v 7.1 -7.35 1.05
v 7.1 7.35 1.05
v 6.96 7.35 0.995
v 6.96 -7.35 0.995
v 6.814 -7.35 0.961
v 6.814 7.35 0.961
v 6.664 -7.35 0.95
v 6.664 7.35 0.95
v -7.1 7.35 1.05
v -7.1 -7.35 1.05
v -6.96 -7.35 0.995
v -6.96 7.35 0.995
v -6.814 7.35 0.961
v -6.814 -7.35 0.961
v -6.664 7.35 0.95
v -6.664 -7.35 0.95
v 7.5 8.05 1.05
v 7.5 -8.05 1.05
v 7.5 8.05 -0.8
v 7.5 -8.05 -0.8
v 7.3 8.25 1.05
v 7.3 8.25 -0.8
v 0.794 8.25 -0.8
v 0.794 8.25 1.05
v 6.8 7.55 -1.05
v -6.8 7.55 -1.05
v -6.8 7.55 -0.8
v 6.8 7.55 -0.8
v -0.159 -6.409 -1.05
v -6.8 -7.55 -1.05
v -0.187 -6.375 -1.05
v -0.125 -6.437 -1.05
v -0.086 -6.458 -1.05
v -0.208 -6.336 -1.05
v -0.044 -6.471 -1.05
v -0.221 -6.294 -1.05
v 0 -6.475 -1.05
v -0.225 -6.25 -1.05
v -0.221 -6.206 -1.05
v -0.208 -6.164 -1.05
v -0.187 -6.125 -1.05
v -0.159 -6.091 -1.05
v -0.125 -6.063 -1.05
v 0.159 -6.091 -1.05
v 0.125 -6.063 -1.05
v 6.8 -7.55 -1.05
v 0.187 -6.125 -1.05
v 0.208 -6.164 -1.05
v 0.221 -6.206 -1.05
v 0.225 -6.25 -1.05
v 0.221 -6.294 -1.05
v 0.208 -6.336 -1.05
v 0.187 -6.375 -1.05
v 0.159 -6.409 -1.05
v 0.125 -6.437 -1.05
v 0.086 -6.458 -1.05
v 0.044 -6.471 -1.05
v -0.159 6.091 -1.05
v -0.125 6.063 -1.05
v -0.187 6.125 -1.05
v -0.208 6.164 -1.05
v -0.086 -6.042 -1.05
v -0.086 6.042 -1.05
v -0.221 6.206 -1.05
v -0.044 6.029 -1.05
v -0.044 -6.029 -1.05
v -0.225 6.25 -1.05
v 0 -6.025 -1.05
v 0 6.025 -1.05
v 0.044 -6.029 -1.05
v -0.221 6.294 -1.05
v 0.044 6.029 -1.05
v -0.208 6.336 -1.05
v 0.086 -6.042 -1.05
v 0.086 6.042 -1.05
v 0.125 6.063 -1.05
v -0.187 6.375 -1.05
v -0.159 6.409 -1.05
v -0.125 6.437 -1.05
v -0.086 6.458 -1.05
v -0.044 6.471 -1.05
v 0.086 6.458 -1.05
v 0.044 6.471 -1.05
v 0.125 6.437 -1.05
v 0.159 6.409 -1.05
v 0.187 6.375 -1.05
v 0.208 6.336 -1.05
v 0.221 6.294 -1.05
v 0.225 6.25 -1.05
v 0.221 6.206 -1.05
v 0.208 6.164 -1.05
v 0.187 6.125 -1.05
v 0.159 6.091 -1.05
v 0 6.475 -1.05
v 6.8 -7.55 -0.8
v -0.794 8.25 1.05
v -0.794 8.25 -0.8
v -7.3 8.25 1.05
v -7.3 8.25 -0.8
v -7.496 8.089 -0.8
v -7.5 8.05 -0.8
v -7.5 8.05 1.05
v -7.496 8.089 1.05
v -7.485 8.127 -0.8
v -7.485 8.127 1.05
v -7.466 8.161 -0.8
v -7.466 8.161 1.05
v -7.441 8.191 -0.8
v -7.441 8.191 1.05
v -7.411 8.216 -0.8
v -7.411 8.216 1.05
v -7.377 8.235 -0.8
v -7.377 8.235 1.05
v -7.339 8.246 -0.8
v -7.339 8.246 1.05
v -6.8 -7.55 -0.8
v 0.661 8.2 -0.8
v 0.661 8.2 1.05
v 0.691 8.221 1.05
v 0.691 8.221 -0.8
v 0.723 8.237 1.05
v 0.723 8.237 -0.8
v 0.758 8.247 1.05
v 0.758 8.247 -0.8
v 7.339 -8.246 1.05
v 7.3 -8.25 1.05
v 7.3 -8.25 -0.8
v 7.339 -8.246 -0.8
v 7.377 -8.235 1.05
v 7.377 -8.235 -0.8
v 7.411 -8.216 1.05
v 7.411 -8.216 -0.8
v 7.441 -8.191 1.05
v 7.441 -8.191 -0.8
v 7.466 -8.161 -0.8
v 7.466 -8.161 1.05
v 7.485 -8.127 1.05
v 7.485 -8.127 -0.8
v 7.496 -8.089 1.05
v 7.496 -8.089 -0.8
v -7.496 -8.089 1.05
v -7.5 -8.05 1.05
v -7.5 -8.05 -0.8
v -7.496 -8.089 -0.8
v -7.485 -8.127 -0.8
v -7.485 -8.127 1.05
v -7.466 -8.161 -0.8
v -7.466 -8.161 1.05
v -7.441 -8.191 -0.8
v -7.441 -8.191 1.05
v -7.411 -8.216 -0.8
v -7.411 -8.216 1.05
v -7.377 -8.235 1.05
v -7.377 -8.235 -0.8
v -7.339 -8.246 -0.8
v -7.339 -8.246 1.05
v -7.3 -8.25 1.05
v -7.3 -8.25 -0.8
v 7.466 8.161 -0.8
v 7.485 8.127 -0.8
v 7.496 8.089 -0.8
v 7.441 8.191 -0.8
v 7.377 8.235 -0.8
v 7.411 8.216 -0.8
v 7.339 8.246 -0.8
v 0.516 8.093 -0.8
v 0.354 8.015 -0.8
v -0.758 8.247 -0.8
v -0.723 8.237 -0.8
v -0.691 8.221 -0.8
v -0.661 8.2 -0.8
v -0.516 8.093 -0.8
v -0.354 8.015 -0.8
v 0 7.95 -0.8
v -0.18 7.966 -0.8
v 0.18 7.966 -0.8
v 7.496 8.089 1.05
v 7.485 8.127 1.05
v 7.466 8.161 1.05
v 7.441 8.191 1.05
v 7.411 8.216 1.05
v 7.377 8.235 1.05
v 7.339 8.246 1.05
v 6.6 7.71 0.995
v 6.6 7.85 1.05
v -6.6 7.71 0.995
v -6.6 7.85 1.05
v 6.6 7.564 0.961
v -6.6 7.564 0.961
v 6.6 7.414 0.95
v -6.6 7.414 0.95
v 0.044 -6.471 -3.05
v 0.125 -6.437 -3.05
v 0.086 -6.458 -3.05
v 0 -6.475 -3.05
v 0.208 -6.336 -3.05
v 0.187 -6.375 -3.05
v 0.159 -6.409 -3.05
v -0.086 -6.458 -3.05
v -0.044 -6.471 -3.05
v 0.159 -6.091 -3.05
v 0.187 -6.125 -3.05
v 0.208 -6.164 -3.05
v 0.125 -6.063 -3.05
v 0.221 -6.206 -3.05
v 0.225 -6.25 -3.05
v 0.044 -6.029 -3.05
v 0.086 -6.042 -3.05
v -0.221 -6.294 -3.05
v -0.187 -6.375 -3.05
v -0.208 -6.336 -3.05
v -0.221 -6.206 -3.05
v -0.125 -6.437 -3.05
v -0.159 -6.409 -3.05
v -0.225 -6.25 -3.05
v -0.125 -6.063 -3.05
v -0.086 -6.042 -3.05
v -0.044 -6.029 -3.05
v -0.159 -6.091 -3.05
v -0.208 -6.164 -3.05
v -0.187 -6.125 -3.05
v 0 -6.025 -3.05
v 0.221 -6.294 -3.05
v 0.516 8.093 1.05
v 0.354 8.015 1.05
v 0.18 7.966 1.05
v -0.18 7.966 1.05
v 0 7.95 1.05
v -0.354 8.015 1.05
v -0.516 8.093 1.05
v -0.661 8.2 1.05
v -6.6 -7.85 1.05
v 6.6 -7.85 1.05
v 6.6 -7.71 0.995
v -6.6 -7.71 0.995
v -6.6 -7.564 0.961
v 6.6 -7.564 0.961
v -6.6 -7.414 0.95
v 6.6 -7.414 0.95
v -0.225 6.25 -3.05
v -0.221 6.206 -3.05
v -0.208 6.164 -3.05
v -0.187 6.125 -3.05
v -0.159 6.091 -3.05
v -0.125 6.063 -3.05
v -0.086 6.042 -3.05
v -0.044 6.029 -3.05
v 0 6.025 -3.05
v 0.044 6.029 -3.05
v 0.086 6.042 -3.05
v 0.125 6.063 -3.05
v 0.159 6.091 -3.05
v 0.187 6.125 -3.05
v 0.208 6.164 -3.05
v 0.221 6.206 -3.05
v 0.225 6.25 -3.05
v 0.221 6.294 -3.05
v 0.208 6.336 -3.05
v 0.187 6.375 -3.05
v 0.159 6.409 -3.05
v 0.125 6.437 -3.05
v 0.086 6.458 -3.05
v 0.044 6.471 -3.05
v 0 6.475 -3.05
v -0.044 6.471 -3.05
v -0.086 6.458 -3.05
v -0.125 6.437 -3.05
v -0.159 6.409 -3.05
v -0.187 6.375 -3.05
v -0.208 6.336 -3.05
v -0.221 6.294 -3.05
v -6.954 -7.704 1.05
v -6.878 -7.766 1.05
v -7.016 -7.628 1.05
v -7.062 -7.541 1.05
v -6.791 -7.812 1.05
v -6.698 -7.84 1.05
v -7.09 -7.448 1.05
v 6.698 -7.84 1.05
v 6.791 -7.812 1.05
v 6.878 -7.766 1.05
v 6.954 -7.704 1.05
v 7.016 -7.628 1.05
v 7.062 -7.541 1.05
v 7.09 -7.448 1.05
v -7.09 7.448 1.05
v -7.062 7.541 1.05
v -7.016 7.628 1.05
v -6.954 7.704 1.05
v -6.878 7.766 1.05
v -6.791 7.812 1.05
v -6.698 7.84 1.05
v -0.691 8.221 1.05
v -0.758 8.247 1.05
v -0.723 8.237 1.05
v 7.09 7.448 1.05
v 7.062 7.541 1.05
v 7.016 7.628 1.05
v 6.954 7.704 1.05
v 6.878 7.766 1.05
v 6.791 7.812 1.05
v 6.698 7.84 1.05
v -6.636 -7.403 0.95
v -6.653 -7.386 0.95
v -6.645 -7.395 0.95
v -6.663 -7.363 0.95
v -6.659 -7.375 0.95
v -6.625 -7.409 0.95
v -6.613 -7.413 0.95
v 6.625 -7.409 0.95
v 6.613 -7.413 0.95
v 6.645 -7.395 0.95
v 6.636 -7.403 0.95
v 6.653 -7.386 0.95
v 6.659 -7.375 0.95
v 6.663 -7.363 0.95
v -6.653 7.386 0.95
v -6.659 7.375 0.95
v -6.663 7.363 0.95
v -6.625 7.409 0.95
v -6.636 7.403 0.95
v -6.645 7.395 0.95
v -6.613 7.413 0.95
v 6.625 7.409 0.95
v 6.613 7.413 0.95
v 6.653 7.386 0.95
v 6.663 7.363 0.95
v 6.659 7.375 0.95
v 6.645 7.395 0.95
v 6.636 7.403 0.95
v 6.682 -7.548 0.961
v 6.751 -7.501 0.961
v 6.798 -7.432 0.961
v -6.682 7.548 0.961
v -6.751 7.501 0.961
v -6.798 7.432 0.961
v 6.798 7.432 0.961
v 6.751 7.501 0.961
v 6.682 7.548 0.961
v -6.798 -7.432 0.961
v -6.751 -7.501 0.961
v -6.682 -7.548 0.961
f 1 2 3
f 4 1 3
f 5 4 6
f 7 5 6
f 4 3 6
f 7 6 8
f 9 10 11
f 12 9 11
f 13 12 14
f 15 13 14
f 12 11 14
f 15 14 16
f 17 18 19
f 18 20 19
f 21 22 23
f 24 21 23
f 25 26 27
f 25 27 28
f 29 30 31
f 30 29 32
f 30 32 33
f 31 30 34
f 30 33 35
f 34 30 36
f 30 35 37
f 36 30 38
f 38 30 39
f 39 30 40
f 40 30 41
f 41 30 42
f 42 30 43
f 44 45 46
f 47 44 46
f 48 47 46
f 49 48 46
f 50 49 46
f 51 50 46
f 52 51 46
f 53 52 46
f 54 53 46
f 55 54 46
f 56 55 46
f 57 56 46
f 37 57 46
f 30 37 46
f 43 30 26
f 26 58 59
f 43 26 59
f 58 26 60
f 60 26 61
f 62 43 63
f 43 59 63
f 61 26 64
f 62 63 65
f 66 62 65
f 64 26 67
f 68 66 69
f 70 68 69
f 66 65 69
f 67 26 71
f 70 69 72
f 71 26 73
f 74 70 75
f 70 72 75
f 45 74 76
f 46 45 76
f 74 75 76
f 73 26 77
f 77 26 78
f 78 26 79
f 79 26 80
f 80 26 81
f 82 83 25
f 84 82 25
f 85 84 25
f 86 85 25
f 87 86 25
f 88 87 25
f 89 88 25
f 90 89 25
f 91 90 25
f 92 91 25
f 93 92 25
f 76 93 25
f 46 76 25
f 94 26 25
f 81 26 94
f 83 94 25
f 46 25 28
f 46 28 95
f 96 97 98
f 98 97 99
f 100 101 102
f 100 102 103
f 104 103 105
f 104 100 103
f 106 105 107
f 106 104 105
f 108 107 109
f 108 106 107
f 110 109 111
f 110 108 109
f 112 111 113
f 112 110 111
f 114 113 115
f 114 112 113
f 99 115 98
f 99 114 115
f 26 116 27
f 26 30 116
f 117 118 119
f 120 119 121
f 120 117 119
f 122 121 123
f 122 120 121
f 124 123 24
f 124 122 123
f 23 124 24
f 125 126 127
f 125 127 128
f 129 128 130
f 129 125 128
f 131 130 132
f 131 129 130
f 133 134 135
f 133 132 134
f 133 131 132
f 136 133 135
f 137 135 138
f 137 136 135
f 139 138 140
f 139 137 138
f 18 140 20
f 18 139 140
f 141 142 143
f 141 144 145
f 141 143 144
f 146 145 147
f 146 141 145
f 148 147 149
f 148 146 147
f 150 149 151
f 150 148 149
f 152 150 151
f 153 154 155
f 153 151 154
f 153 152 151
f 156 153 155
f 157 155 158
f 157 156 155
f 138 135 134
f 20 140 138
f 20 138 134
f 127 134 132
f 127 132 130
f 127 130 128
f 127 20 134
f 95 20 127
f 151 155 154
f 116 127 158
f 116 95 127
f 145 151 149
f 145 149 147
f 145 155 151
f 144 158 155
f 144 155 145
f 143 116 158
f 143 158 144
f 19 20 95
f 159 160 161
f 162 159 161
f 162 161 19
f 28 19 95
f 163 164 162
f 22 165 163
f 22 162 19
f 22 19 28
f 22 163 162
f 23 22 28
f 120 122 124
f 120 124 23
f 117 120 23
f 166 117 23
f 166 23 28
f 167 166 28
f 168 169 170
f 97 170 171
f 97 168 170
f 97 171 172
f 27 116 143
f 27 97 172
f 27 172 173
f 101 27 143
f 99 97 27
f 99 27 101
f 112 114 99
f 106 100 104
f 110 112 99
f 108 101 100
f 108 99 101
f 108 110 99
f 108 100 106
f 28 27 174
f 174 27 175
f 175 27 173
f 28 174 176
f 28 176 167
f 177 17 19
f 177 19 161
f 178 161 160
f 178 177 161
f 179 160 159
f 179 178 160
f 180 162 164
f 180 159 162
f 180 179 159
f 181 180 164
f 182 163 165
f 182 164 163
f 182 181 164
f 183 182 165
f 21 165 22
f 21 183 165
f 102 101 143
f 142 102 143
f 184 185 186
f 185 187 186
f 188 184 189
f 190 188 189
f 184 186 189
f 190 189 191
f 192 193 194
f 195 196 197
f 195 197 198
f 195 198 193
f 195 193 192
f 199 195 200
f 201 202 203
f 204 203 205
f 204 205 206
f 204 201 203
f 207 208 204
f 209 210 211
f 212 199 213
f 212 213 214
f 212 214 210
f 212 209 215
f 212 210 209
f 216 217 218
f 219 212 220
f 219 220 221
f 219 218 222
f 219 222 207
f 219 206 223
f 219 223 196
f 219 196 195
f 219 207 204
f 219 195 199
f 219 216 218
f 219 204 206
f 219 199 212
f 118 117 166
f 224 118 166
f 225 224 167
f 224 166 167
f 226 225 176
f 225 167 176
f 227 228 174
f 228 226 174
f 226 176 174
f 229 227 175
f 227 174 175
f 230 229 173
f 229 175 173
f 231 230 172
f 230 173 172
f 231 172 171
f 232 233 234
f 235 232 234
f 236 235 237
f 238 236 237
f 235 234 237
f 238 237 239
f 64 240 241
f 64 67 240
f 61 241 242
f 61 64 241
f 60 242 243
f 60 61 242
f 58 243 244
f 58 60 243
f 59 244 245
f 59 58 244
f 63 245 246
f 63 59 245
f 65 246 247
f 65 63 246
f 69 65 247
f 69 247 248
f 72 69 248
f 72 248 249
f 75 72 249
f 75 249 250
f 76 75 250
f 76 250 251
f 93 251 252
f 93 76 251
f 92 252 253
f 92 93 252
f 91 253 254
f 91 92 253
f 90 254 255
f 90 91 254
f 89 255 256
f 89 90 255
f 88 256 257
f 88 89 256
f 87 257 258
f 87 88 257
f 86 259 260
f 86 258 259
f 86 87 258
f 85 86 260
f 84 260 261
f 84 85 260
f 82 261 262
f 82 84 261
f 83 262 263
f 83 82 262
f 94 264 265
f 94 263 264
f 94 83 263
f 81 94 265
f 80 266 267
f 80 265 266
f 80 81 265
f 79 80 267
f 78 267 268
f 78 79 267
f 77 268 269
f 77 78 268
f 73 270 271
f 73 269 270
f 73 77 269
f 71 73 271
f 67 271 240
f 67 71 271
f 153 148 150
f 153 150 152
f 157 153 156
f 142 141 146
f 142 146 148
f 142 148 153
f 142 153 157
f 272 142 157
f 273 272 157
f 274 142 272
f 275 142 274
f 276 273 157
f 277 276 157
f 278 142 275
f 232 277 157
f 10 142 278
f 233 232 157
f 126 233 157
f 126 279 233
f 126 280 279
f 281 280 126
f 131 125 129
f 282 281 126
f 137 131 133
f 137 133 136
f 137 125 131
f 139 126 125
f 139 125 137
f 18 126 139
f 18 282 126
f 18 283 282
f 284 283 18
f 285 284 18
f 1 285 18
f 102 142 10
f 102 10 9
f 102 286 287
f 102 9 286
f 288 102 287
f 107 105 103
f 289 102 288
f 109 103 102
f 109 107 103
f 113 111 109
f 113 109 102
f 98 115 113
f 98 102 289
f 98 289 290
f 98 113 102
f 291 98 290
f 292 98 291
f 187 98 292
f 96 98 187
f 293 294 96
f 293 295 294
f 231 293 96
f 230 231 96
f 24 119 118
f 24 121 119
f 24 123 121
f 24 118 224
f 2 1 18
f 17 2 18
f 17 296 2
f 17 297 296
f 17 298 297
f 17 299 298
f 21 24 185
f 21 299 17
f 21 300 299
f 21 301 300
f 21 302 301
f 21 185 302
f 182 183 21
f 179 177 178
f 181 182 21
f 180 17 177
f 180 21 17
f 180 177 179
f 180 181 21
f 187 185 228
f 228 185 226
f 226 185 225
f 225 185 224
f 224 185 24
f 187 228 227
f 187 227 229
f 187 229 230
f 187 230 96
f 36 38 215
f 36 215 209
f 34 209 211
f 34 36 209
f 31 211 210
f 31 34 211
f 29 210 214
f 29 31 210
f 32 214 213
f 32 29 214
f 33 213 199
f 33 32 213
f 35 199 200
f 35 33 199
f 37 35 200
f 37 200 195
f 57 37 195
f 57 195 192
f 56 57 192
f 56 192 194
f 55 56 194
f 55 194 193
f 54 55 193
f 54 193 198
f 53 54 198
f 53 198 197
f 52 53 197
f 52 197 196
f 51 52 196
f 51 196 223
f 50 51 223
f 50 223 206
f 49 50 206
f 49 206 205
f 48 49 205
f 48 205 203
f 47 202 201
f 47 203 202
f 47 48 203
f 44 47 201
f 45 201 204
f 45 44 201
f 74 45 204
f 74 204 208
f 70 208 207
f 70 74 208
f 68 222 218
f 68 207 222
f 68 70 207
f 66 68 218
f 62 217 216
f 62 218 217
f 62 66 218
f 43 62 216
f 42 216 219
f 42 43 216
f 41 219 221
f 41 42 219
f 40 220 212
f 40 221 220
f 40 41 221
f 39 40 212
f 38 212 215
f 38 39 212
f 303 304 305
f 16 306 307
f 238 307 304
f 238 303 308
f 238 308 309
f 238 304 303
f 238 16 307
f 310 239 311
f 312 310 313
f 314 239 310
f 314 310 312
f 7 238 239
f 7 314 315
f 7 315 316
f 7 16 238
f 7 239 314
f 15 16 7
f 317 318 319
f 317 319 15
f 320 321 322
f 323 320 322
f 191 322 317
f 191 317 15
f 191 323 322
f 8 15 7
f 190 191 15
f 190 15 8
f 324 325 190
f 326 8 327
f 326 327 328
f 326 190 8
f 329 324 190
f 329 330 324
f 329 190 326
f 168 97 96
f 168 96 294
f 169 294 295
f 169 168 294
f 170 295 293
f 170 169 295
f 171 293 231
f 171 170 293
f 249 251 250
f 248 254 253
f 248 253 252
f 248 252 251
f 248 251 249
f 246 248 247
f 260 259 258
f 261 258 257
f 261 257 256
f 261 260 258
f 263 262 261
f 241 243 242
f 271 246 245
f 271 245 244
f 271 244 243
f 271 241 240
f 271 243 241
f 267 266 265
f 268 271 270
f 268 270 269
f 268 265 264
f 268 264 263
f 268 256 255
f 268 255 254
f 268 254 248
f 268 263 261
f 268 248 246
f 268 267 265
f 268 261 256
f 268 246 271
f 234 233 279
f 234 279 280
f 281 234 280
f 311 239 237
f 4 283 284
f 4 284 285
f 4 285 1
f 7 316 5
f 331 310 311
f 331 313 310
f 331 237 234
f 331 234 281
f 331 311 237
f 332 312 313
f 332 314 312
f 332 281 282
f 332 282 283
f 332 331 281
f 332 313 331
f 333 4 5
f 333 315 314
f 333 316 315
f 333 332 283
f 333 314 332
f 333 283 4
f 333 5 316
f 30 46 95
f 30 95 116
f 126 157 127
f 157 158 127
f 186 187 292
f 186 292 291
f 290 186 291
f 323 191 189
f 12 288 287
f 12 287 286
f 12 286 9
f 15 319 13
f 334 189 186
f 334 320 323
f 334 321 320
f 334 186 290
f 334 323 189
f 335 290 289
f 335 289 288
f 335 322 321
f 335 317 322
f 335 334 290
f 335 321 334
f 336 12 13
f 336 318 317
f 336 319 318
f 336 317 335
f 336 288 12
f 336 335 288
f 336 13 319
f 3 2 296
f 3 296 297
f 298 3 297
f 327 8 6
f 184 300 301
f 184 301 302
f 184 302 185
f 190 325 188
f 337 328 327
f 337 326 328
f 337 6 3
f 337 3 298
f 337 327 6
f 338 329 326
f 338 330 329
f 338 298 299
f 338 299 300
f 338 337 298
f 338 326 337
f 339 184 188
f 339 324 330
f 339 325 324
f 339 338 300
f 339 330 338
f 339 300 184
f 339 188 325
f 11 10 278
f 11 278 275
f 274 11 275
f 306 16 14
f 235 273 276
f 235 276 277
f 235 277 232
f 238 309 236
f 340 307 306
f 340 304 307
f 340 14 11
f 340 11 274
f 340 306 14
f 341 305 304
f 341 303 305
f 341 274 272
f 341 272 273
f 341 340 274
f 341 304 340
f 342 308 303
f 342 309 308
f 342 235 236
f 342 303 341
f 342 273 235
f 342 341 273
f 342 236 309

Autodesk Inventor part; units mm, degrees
ref_plane "YZ Plane" through (0, 0, 0) normal (1, 0, 0) x (0, 1, 0)
ref_plane "XZ Plane" through (0, 0, 0) normal (0, 1, 0) x (-1, 0, 0)
ref_plane "XY Plane" through (0, 0, 0) normal (0, 0, 1) x (1, 0, 0)
sketch "Sketch1" plane through (0, 0, 0) normal (0, 0, 1) x (1, 0, 0)
  line L0 (-7.5, -8.25) -> (7.5, -8.25)
  line L1 (7.5, -8.25) -> (7.5, 8.25)
  line L2 (7.5, 8.25) -> (-7.5, 8.25)
  line L3 (-7.5, 8.25) -> (-7.5, -8.25)
  line L4 (-7.5, -8.25) -> (7.5, 8.25) construction
  line L5 (7.5, -8.25) -> (-7.5, 8.25) construction
  arc A0 (-0.7141, 8.25) -> (0.7141, 8.25) centre (0, 8.95) ccw
  line L6 (0, 7.95) -> (0, 8.25) construction
  point P0 (0, 0)
  dimension "d0" = 15
  dimension "d1" = 16.5
  dimension "d23" = 0.3
  dimension "d24" = 1
extrude "Extrusion1" add sketch "Sketch1" along normal mid plane 2.1 contours L3 L2 A0 L1 L0
fillet "Fillet1" radius 0.2 6 edges at (-7.5, 8.25, 0) (7.5, 8.25, 0) (7.5, -8.25, 0) (-7.5, -8.25, 0) (-0.7141, 8.25, 0) (0.7141, 8.25, 0)
sketch "Sketch2" plane through (0, 0, 1.05) normal (0, 0, 1) x (1, 0, 0)
  arc A0 (-7.5, -8.05) -> (-7.3, -8.25) centre (-7.3, -8.05) ccw projected
  line L0 (-7.3, -8.25) -> (7.3, -8.25) projected
  arc A1 (7.3, -8.25) -> (7.5, -8.05) centre (7.3, -8.05) ccw projected
  line L1 (7.5, -8.05) -> (7.5, 8.05) projected
  arc A2 (7.5, 8.05) -> (7.3, 8.25) centre (7.3, 8.05) ccw projected
  line L2 (7.3, 8.25) -> (0.7937, 8.25) projected
  arc A3 (-7.3, 8.25) -> (-7.5, 8.05) centre (-7.3, 8.05) ccw projected
  line L3 (-7.5, 8.05) -> (-7.5, -8.05) projected
  line L4 (6.6, -7.85) -> (-6.6, -7.85)
  line L5 (-7.1, -7.35) -> (-7.1, 7.35)
  line L6 (-6.6, 7.85) -> (6.6, 7.85)
  line L7 (7.1, 7.35) -> (7.1, -7.35)
  line L8 (7.1, -7.85) -> (-7.1, 7.85) construction
  line L9 (-7.1, -7.85) -> (7.1, 7.85) construction
  arc A4 (-6.6, 7.85) -> (-7.1, 7.35) centre (-6.6, 7.35) ccw
  arc A5 (7.1, 7.35) -> (6.6, 7.85) centre (6.6, 7.35) ccw
  arc A6 (6.6, -7.85) -> (7.1, -7.35) centre (6.6, -7.35) ccw
  arc A7 (-7.1, -7.35) -> (-6.6, -7.85) centre (-6.6, -7.35) ccw
  arc A8 (-0.6614, 8.2) -> (0.6614, 8.2) centre (0, 8.95) ccw projected
  line L10 (-0.7937, 8.25) -> (-7.3, 8.25) projected
  arc A9 (0.7937, 8.25) -> (0.6614, 8.2) centre (0.7937, 8.05) ccw projected
  arc A10 (-0.6614, 8.2) -> (-0.7937, 8.25) centre (-0.7937, 8.05) ccw projected
  point P0 (0, 0)
  dimension "d5" = 0.4
  dimension "d6" = 0.4
  dimension "d7" = 0.5
extrude "Extrusion2" cut sketch "Sketch2" against normal blind 0.1 contours L4 A7 L5 A4 L6 A5 L7 A6
fillet "Fillet2" radius 1 8 edges at (-7.1, 0, 0.95) (-6.9536, 7.7036, 0.95) (0, 7.85, 0.95) (6.9536, 7.7036, 0.95) (7.1, 0, 0.95) (6.9536, -7.7036, 0.95) (0, -7.85, 0.95) (-6.9536, -7.7036, 0.95)
sketch "Sketch4" plane through (0, 0, -1.05) normal (0, 0, -1) x (-1, 0, 0)
  arc A0 (-0.6614, 8.2) -> (-0.7937, 8.25) centre (-0.7937, 8.05) ccw projected
  line L0 (-0.7937, 8.25) -> (-7.3, 8.25) projected
  arc A1 (-7.3, 8.25) -> (-7.5, 8.05) centre (-7.3, 8.05) ccw projected
  line L1 (-7.5, 8.05) -> (-7.5, -8.05) projected
  arc A2 (-7.5, -8.05) -> (-7.3, -8.25) centre (-7.3, -8.05) ccw projected
  line L2 (-7.3, -8.25) -> (7.3, -8.25) projected
  arc A3 (7.3, -8.25) -> (7.5, -8.05) centre (7.3, -8.05) ccw projected
  line L3 (7.5, -8.05) -> (7.5, 8.05) projected
  arc A4 (7.5, 8.05) -> (7.3, 8.25) centre (7.3, 8.05) ccw projected
  line L4 (7.3, 8.25) -> (0.7937, 8.25) projected
  arc A5 (0.7937, 8.25) -> (0.6614, 8.2) centre (0.7937, 8.05) ccw projected
  arc A6 (-0.6614, 8.2) -> (0.6614, 8.2) centre (0, 8.95) ccw projected
  line L5 (-6.8, -7.55) -> (6.8, -7.55)
  line L6 (6.8, -7.55) -> (6.8, 7.55)
  line L7 (6.8, 7.55) -> (-6.8, 7.55)
  line L8 (-6.8, 7.55) -> (-6.8, -7.55)
  line L9 (-6.8, -7.55) -> (6.8, 7.55) construction
  line L10 (6.8, -7.55) -> (-6.8, 7.55) construction
  point P0 (0, 0)
  dimension "d25" = 13.6
  dimension "d26" = 15.1
extrude "Extrusion4" cut sketch "Sketch4" against normal blind 0.25
sketch "Sketch5" plane through (0, 0, -1.05) normal (0, 0, -1) x (-1, 0, 0)
  circle A0 centre (0, 6.25) radius 0.225
  circle A1 centre (0, -6.25) radius 0.225
  line L0 (0, 6.25) -> (0, -6.25) construction
  point P0 (0, 0)
  point P1 (0, 0)
  dimension "d29" = 0.45
  dimension "d30" = 12.5
extrude "Extrusion5" add sketch "Sketch5" along normal blind 2
equation "\"d6\" = d5"
properties part number "Semiconductor_RadiationDiode" material "ABS Plastic"
